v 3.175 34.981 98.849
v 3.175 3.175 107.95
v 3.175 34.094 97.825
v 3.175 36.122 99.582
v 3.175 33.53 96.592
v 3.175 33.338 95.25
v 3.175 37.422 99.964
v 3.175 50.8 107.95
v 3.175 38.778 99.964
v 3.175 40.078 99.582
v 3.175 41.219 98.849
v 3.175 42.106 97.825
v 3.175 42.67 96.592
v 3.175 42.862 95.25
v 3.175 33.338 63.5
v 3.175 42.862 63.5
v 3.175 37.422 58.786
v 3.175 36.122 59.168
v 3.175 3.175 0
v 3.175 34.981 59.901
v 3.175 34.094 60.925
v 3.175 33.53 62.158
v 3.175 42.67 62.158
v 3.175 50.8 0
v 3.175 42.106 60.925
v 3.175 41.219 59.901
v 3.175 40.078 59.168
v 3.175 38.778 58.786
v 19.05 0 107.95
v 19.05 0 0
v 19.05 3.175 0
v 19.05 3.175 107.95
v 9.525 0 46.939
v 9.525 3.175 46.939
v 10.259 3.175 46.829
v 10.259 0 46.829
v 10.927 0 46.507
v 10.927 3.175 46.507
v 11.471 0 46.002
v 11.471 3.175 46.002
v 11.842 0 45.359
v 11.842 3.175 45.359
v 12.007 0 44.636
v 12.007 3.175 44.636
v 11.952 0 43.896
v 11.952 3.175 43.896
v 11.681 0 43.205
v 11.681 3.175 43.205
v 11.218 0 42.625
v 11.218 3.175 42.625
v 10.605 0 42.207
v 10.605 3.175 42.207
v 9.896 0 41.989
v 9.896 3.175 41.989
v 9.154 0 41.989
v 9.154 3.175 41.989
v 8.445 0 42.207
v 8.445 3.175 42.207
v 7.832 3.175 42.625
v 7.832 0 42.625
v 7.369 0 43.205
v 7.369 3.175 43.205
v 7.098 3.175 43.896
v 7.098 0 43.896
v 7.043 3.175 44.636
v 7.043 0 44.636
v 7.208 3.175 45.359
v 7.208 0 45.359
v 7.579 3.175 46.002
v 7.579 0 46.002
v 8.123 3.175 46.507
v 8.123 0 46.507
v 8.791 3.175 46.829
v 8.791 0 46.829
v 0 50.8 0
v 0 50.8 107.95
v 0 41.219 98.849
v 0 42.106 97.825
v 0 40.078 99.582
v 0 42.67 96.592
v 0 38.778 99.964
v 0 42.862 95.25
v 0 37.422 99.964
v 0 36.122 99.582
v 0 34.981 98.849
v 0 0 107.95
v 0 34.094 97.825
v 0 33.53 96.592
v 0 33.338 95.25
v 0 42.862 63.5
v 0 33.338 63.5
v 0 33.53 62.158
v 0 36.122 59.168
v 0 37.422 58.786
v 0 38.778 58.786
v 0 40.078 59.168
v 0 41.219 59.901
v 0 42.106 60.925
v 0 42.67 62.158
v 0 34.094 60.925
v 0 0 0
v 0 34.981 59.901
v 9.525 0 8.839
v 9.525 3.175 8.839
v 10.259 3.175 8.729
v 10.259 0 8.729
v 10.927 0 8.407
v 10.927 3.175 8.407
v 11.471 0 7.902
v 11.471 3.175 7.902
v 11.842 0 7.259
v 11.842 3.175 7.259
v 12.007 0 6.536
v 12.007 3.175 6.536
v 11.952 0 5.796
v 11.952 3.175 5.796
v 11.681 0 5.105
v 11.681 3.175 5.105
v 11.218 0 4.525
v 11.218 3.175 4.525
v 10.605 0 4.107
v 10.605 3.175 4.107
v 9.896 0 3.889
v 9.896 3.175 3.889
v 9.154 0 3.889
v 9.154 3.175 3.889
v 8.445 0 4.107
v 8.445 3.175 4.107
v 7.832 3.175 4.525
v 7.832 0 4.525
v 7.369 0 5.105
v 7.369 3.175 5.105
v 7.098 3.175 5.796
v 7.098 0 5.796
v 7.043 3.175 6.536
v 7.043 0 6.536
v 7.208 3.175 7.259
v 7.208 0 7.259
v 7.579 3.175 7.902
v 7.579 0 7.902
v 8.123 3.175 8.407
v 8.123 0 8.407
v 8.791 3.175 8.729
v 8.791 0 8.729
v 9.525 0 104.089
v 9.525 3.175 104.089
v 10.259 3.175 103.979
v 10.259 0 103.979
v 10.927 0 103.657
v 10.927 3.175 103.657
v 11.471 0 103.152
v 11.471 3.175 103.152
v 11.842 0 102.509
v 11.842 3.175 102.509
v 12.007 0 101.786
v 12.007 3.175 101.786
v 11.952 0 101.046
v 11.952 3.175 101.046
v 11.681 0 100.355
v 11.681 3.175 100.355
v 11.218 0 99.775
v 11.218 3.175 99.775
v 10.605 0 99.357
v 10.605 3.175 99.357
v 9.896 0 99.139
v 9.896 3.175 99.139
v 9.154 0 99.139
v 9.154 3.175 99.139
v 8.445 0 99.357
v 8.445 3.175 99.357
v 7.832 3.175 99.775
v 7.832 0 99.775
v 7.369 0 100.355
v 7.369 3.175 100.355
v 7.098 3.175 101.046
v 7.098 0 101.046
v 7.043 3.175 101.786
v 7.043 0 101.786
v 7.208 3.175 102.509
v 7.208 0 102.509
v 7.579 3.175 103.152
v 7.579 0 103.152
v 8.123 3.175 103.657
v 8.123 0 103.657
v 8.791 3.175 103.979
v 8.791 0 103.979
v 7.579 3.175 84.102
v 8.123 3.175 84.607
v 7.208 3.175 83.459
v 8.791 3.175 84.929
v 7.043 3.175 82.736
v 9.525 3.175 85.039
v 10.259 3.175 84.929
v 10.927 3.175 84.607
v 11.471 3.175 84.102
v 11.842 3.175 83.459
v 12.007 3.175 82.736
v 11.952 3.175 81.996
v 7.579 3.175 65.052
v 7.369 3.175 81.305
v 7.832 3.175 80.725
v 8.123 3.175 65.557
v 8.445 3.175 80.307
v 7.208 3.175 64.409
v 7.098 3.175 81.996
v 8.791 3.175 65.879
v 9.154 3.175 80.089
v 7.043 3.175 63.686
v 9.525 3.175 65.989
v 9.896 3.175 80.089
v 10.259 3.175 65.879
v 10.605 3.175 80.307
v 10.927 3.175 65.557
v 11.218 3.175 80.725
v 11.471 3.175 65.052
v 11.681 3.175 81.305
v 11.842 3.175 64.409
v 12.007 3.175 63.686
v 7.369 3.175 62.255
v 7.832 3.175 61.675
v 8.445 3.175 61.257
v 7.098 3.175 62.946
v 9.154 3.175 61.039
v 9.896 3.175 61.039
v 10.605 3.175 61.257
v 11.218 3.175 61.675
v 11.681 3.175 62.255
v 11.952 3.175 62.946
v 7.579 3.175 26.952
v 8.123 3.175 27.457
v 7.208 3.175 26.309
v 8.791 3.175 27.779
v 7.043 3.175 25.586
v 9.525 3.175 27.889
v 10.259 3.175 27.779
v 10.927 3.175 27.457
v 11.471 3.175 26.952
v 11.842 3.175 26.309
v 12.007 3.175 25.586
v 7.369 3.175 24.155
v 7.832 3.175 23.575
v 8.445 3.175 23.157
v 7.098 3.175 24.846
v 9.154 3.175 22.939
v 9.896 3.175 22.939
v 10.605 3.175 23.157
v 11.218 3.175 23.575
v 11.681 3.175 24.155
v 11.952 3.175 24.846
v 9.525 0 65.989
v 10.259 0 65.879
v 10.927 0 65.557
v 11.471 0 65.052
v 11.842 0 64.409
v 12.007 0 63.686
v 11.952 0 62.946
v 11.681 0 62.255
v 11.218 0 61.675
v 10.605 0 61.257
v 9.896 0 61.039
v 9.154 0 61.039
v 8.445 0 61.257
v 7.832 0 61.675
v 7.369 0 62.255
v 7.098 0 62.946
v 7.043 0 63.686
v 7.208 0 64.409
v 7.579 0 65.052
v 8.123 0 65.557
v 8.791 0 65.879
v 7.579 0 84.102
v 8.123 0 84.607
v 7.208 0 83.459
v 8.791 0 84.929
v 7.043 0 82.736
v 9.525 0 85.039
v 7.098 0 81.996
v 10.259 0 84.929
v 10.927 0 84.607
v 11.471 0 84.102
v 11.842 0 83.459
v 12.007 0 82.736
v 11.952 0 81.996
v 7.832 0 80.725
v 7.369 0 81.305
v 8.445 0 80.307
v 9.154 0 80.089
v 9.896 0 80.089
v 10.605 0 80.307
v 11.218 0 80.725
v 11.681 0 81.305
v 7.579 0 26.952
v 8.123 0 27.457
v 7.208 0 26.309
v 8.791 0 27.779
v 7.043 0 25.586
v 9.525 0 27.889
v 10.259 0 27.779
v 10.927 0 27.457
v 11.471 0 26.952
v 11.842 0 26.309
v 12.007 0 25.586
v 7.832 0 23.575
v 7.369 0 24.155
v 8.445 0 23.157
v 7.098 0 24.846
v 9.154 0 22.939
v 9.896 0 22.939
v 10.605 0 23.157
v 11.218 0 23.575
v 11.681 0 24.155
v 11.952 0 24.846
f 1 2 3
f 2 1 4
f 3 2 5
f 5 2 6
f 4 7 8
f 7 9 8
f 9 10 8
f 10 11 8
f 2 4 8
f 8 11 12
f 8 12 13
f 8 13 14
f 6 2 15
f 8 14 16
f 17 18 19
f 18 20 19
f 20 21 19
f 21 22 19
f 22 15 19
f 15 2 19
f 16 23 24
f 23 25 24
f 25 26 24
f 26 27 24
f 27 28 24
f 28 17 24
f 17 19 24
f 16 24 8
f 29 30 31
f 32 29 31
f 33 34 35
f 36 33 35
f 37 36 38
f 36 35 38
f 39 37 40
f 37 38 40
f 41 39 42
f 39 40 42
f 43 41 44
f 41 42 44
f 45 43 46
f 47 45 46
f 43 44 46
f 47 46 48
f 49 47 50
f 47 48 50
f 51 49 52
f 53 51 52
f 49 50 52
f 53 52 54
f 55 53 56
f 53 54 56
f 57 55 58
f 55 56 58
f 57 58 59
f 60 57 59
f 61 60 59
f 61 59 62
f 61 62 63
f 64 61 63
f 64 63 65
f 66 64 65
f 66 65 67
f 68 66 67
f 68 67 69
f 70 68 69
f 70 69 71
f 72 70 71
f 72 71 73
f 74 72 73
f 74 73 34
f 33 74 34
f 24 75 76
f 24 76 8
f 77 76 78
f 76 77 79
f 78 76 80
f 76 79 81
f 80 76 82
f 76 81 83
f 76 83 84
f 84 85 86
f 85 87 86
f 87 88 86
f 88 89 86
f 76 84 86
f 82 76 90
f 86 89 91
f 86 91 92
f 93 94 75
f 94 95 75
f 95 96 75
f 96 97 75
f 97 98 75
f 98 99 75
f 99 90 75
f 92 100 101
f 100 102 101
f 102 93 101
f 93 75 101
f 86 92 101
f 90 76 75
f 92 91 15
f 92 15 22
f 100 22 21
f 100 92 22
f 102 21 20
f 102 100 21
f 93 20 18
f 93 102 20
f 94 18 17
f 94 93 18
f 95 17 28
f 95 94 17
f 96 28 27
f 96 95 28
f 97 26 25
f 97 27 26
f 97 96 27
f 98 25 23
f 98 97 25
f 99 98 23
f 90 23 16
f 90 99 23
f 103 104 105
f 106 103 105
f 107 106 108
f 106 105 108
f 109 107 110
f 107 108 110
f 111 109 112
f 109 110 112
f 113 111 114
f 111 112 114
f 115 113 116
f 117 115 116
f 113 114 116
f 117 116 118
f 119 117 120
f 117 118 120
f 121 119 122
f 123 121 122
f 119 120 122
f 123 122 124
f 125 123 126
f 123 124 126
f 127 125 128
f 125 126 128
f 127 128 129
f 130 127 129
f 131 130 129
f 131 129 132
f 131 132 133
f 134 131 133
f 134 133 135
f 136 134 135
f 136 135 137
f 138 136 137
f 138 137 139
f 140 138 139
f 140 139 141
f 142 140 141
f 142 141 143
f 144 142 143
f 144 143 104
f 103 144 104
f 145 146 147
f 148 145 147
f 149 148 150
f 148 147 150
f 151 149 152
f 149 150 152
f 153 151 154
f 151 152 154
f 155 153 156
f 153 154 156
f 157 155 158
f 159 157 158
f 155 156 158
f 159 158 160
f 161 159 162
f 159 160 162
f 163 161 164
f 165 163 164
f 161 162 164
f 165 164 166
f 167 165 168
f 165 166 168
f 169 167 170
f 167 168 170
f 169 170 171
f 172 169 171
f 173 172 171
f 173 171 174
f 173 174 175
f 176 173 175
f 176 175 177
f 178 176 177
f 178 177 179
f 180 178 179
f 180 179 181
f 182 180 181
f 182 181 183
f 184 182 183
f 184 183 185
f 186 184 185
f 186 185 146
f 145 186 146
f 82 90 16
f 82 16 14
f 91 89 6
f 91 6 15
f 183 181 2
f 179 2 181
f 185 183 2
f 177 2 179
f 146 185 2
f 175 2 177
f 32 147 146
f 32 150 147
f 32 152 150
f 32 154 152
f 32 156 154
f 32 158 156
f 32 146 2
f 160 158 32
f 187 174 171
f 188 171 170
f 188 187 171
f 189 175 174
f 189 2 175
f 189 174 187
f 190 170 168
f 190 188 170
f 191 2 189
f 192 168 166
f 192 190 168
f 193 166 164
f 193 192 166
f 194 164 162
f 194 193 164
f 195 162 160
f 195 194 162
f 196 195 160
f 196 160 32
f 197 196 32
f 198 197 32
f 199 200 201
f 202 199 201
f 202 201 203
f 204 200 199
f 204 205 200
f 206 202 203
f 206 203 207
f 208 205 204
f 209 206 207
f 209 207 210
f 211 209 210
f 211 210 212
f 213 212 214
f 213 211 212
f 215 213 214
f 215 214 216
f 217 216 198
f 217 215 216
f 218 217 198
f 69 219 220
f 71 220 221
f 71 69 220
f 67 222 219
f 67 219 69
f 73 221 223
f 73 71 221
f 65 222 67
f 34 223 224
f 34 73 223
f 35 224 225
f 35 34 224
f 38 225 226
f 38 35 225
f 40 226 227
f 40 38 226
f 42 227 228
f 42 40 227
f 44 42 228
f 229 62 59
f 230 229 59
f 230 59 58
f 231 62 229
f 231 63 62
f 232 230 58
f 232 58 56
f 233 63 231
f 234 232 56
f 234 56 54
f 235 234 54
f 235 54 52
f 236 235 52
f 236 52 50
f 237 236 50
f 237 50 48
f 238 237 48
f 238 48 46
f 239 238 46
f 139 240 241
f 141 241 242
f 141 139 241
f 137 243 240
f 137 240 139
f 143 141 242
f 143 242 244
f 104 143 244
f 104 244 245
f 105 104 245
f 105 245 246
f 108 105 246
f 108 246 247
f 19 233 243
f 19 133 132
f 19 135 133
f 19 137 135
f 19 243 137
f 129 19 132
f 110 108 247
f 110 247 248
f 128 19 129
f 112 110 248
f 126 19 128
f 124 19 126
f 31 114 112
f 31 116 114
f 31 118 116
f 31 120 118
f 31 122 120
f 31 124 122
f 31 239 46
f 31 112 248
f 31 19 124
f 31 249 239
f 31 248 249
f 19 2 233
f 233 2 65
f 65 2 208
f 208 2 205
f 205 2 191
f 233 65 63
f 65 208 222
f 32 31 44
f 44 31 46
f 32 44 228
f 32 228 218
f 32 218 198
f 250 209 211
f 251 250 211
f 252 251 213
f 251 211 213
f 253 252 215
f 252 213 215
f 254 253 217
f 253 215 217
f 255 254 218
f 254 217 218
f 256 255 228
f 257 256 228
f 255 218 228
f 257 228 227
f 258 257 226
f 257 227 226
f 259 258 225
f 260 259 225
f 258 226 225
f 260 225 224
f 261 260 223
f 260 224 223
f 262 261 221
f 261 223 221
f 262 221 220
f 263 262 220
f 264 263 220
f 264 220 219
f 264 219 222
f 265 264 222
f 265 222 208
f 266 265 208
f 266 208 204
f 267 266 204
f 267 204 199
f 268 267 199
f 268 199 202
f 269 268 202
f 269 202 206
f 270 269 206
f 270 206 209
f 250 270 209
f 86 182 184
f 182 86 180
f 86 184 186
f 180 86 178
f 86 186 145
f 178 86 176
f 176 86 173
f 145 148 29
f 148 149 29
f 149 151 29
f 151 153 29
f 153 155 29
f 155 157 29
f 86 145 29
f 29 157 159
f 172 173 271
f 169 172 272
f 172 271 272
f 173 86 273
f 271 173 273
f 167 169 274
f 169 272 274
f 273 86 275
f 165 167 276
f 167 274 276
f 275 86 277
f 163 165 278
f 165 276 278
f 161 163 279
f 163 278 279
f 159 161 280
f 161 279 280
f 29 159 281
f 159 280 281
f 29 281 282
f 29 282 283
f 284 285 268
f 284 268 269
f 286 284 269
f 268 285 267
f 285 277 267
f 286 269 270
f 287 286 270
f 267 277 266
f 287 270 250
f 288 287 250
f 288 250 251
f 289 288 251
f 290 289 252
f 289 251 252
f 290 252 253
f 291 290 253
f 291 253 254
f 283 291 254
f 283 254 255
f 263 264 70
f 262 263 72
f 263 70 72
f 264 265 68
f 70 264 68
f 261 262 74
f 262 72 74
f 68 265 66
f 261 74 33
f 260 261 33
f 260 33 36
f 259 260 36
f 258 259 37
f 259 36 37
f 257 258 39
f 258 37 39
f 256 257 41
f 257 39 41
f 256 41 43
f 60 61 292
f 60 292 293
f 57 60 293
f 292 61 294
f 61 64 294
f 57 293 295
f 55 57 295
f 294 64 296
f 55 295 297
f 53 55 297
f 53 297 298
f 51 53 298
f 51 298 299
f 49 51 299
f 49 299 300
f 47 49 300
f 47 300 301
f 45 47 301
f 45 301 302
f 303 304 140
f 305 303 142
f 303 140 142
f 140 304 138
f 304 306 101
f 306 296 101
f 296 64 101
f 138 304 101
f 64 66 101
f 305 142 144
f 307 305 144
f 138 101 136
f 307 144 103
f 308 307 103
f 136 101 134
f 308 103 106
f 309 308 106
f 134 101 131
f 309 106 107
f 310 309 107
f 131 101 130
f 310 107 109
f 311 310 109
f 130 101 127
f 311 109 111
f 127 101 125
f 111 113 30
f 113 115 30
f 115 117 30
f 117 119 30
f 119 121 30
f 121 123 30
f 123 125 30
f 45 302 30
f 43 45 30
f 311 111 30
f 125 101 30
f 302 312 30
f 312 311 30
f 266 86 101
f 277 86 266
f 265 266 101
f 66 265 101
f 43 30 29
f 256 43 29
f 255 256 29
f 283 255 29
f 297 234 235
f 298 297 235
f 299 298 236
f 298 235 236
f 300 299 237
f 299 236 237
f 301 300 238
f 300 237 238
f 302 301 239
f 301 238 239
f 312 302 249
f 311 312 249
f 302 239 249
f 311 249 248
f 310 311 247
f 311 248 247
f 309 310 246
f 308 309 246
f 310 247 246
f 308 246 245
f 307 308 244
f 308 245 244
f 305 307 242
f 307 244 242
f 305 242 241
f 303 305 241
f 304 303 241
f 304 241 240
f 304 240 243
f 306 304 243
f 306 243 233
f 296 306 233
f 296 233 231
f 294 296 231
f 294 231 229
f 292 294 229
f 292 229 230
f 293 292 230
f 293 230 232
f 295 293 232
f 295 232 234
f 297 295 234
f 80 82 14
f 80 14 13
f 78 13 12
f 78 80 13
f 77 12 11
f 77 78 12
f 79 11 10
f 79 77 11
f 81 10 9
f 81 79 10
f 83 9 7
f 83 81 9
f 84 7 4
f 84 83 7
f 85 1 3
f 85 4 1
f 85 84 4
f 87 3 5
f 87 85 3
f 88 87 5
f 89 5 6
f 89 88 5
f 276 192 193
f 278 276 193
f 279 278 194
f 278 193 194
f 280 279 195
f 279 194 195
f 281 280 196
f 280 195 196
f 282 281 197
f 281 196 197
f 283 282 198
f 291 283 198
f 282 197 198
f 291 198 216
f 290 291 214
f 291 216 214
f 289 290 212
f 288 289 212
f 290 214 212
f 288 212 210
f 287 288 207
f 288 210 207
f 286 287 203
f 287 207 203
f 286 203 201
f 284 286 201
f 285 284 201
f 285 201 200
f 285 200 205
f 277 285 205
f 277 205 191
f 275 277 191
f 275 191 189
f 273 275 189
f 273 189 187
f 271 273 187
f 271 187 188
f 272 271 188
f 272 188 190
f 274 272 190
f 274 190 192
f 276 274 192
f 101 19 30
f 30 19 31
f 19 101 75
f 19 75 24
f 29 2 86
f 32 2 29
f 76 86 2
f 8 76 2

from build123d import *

# Parameters (mm, degrees)
SKETCH1_W           = 3.175
SKETCH1_H           = 47.625
SKETCH1_H_2         = 3.175
SKETCH1_W_2         = 15.875
BOSS_EXTRUDE1_DEPTH = 107.95
SKETCH2_R           = 2.4892
CUT_EXTRUDE1_DEPTH  = 107.95
CUT_EXTRUDE2_DEPTH  = 165.1


with BuildPart() as part:
    # Sketch1 → Boss-Extrude1 (new body)
    with BuildSketch(Plane.XY):
        with Locations((1.5875, 26.9875)):
            Rectangle(SKETCH1_W, SKETCH1_H)
        with Locations((1.5875, 1.5875)):
            Rectangle(SKETCH1_W, SKETCH1_H_2)
        with Locations((11.1125, 1.5875)):
            Rectangle(SKETCH1_W_2, SKETCH1_H_2)
    extrude(amount=BOSS_EXTRUDE1_DEPTH)

    # Sketch2 → Cut-Extrude1 (cut)
    with BuildSketch(Plane(origin=(0, 3.175, 0), x_dir=(1, 0, 0), z_dir=(0, 1, 0))):
        with Locations(Location((9.525, -6.35, 0), (0, 0, 270))):
            Circle(SKETCH2_R)
        with Locations(Location((9.525, -25.4, 0), (0, 0, 270))):
            Circle(SKETCH2_R)
        with Locations(Location((9.525, -44.45, 0), (0, 0, 270))):
            Circle(SKETCH2_R)
        with Locations(Location((9.525, -63.5, 0), (0, 0, 270))):
            Circle(SKETCH2_R)
        with Locations(Location((9.525, -82.55, 0), (0, 0, 270))):
            Circle(SKETCH2_R)
        with Locations(Location((9.525, -101.6, 0), (0, 0, 270))):
            Circle(SKETCH2_R)
    extrude(amount=-CUT_EXTRUDE1_DEPTH, mode=Mode.SUBTRACT)

    # Sketch3 → Cut-Extrude2 (cut)
    with BuildSketch(Plane.ZY):
        with BuildLine():
            Line((63.5, 42.8625), (95.25, 42.8625))
            ThreePointArc((95.25, 42.8625), (100.0125, 38.1), (95.25, 33.3375))
            Line((95.25, 33.3375), (63.5, 33.3375))
            ThreePointArc((63.5, 33.3375), (58.7375, 38.1), (63.5, 42.8625))
        make_face()
    extrude(amount=-CUT_EXTRUDE2_DEPTH, mode=Mode.SUBTRACT)


solid = part.part
